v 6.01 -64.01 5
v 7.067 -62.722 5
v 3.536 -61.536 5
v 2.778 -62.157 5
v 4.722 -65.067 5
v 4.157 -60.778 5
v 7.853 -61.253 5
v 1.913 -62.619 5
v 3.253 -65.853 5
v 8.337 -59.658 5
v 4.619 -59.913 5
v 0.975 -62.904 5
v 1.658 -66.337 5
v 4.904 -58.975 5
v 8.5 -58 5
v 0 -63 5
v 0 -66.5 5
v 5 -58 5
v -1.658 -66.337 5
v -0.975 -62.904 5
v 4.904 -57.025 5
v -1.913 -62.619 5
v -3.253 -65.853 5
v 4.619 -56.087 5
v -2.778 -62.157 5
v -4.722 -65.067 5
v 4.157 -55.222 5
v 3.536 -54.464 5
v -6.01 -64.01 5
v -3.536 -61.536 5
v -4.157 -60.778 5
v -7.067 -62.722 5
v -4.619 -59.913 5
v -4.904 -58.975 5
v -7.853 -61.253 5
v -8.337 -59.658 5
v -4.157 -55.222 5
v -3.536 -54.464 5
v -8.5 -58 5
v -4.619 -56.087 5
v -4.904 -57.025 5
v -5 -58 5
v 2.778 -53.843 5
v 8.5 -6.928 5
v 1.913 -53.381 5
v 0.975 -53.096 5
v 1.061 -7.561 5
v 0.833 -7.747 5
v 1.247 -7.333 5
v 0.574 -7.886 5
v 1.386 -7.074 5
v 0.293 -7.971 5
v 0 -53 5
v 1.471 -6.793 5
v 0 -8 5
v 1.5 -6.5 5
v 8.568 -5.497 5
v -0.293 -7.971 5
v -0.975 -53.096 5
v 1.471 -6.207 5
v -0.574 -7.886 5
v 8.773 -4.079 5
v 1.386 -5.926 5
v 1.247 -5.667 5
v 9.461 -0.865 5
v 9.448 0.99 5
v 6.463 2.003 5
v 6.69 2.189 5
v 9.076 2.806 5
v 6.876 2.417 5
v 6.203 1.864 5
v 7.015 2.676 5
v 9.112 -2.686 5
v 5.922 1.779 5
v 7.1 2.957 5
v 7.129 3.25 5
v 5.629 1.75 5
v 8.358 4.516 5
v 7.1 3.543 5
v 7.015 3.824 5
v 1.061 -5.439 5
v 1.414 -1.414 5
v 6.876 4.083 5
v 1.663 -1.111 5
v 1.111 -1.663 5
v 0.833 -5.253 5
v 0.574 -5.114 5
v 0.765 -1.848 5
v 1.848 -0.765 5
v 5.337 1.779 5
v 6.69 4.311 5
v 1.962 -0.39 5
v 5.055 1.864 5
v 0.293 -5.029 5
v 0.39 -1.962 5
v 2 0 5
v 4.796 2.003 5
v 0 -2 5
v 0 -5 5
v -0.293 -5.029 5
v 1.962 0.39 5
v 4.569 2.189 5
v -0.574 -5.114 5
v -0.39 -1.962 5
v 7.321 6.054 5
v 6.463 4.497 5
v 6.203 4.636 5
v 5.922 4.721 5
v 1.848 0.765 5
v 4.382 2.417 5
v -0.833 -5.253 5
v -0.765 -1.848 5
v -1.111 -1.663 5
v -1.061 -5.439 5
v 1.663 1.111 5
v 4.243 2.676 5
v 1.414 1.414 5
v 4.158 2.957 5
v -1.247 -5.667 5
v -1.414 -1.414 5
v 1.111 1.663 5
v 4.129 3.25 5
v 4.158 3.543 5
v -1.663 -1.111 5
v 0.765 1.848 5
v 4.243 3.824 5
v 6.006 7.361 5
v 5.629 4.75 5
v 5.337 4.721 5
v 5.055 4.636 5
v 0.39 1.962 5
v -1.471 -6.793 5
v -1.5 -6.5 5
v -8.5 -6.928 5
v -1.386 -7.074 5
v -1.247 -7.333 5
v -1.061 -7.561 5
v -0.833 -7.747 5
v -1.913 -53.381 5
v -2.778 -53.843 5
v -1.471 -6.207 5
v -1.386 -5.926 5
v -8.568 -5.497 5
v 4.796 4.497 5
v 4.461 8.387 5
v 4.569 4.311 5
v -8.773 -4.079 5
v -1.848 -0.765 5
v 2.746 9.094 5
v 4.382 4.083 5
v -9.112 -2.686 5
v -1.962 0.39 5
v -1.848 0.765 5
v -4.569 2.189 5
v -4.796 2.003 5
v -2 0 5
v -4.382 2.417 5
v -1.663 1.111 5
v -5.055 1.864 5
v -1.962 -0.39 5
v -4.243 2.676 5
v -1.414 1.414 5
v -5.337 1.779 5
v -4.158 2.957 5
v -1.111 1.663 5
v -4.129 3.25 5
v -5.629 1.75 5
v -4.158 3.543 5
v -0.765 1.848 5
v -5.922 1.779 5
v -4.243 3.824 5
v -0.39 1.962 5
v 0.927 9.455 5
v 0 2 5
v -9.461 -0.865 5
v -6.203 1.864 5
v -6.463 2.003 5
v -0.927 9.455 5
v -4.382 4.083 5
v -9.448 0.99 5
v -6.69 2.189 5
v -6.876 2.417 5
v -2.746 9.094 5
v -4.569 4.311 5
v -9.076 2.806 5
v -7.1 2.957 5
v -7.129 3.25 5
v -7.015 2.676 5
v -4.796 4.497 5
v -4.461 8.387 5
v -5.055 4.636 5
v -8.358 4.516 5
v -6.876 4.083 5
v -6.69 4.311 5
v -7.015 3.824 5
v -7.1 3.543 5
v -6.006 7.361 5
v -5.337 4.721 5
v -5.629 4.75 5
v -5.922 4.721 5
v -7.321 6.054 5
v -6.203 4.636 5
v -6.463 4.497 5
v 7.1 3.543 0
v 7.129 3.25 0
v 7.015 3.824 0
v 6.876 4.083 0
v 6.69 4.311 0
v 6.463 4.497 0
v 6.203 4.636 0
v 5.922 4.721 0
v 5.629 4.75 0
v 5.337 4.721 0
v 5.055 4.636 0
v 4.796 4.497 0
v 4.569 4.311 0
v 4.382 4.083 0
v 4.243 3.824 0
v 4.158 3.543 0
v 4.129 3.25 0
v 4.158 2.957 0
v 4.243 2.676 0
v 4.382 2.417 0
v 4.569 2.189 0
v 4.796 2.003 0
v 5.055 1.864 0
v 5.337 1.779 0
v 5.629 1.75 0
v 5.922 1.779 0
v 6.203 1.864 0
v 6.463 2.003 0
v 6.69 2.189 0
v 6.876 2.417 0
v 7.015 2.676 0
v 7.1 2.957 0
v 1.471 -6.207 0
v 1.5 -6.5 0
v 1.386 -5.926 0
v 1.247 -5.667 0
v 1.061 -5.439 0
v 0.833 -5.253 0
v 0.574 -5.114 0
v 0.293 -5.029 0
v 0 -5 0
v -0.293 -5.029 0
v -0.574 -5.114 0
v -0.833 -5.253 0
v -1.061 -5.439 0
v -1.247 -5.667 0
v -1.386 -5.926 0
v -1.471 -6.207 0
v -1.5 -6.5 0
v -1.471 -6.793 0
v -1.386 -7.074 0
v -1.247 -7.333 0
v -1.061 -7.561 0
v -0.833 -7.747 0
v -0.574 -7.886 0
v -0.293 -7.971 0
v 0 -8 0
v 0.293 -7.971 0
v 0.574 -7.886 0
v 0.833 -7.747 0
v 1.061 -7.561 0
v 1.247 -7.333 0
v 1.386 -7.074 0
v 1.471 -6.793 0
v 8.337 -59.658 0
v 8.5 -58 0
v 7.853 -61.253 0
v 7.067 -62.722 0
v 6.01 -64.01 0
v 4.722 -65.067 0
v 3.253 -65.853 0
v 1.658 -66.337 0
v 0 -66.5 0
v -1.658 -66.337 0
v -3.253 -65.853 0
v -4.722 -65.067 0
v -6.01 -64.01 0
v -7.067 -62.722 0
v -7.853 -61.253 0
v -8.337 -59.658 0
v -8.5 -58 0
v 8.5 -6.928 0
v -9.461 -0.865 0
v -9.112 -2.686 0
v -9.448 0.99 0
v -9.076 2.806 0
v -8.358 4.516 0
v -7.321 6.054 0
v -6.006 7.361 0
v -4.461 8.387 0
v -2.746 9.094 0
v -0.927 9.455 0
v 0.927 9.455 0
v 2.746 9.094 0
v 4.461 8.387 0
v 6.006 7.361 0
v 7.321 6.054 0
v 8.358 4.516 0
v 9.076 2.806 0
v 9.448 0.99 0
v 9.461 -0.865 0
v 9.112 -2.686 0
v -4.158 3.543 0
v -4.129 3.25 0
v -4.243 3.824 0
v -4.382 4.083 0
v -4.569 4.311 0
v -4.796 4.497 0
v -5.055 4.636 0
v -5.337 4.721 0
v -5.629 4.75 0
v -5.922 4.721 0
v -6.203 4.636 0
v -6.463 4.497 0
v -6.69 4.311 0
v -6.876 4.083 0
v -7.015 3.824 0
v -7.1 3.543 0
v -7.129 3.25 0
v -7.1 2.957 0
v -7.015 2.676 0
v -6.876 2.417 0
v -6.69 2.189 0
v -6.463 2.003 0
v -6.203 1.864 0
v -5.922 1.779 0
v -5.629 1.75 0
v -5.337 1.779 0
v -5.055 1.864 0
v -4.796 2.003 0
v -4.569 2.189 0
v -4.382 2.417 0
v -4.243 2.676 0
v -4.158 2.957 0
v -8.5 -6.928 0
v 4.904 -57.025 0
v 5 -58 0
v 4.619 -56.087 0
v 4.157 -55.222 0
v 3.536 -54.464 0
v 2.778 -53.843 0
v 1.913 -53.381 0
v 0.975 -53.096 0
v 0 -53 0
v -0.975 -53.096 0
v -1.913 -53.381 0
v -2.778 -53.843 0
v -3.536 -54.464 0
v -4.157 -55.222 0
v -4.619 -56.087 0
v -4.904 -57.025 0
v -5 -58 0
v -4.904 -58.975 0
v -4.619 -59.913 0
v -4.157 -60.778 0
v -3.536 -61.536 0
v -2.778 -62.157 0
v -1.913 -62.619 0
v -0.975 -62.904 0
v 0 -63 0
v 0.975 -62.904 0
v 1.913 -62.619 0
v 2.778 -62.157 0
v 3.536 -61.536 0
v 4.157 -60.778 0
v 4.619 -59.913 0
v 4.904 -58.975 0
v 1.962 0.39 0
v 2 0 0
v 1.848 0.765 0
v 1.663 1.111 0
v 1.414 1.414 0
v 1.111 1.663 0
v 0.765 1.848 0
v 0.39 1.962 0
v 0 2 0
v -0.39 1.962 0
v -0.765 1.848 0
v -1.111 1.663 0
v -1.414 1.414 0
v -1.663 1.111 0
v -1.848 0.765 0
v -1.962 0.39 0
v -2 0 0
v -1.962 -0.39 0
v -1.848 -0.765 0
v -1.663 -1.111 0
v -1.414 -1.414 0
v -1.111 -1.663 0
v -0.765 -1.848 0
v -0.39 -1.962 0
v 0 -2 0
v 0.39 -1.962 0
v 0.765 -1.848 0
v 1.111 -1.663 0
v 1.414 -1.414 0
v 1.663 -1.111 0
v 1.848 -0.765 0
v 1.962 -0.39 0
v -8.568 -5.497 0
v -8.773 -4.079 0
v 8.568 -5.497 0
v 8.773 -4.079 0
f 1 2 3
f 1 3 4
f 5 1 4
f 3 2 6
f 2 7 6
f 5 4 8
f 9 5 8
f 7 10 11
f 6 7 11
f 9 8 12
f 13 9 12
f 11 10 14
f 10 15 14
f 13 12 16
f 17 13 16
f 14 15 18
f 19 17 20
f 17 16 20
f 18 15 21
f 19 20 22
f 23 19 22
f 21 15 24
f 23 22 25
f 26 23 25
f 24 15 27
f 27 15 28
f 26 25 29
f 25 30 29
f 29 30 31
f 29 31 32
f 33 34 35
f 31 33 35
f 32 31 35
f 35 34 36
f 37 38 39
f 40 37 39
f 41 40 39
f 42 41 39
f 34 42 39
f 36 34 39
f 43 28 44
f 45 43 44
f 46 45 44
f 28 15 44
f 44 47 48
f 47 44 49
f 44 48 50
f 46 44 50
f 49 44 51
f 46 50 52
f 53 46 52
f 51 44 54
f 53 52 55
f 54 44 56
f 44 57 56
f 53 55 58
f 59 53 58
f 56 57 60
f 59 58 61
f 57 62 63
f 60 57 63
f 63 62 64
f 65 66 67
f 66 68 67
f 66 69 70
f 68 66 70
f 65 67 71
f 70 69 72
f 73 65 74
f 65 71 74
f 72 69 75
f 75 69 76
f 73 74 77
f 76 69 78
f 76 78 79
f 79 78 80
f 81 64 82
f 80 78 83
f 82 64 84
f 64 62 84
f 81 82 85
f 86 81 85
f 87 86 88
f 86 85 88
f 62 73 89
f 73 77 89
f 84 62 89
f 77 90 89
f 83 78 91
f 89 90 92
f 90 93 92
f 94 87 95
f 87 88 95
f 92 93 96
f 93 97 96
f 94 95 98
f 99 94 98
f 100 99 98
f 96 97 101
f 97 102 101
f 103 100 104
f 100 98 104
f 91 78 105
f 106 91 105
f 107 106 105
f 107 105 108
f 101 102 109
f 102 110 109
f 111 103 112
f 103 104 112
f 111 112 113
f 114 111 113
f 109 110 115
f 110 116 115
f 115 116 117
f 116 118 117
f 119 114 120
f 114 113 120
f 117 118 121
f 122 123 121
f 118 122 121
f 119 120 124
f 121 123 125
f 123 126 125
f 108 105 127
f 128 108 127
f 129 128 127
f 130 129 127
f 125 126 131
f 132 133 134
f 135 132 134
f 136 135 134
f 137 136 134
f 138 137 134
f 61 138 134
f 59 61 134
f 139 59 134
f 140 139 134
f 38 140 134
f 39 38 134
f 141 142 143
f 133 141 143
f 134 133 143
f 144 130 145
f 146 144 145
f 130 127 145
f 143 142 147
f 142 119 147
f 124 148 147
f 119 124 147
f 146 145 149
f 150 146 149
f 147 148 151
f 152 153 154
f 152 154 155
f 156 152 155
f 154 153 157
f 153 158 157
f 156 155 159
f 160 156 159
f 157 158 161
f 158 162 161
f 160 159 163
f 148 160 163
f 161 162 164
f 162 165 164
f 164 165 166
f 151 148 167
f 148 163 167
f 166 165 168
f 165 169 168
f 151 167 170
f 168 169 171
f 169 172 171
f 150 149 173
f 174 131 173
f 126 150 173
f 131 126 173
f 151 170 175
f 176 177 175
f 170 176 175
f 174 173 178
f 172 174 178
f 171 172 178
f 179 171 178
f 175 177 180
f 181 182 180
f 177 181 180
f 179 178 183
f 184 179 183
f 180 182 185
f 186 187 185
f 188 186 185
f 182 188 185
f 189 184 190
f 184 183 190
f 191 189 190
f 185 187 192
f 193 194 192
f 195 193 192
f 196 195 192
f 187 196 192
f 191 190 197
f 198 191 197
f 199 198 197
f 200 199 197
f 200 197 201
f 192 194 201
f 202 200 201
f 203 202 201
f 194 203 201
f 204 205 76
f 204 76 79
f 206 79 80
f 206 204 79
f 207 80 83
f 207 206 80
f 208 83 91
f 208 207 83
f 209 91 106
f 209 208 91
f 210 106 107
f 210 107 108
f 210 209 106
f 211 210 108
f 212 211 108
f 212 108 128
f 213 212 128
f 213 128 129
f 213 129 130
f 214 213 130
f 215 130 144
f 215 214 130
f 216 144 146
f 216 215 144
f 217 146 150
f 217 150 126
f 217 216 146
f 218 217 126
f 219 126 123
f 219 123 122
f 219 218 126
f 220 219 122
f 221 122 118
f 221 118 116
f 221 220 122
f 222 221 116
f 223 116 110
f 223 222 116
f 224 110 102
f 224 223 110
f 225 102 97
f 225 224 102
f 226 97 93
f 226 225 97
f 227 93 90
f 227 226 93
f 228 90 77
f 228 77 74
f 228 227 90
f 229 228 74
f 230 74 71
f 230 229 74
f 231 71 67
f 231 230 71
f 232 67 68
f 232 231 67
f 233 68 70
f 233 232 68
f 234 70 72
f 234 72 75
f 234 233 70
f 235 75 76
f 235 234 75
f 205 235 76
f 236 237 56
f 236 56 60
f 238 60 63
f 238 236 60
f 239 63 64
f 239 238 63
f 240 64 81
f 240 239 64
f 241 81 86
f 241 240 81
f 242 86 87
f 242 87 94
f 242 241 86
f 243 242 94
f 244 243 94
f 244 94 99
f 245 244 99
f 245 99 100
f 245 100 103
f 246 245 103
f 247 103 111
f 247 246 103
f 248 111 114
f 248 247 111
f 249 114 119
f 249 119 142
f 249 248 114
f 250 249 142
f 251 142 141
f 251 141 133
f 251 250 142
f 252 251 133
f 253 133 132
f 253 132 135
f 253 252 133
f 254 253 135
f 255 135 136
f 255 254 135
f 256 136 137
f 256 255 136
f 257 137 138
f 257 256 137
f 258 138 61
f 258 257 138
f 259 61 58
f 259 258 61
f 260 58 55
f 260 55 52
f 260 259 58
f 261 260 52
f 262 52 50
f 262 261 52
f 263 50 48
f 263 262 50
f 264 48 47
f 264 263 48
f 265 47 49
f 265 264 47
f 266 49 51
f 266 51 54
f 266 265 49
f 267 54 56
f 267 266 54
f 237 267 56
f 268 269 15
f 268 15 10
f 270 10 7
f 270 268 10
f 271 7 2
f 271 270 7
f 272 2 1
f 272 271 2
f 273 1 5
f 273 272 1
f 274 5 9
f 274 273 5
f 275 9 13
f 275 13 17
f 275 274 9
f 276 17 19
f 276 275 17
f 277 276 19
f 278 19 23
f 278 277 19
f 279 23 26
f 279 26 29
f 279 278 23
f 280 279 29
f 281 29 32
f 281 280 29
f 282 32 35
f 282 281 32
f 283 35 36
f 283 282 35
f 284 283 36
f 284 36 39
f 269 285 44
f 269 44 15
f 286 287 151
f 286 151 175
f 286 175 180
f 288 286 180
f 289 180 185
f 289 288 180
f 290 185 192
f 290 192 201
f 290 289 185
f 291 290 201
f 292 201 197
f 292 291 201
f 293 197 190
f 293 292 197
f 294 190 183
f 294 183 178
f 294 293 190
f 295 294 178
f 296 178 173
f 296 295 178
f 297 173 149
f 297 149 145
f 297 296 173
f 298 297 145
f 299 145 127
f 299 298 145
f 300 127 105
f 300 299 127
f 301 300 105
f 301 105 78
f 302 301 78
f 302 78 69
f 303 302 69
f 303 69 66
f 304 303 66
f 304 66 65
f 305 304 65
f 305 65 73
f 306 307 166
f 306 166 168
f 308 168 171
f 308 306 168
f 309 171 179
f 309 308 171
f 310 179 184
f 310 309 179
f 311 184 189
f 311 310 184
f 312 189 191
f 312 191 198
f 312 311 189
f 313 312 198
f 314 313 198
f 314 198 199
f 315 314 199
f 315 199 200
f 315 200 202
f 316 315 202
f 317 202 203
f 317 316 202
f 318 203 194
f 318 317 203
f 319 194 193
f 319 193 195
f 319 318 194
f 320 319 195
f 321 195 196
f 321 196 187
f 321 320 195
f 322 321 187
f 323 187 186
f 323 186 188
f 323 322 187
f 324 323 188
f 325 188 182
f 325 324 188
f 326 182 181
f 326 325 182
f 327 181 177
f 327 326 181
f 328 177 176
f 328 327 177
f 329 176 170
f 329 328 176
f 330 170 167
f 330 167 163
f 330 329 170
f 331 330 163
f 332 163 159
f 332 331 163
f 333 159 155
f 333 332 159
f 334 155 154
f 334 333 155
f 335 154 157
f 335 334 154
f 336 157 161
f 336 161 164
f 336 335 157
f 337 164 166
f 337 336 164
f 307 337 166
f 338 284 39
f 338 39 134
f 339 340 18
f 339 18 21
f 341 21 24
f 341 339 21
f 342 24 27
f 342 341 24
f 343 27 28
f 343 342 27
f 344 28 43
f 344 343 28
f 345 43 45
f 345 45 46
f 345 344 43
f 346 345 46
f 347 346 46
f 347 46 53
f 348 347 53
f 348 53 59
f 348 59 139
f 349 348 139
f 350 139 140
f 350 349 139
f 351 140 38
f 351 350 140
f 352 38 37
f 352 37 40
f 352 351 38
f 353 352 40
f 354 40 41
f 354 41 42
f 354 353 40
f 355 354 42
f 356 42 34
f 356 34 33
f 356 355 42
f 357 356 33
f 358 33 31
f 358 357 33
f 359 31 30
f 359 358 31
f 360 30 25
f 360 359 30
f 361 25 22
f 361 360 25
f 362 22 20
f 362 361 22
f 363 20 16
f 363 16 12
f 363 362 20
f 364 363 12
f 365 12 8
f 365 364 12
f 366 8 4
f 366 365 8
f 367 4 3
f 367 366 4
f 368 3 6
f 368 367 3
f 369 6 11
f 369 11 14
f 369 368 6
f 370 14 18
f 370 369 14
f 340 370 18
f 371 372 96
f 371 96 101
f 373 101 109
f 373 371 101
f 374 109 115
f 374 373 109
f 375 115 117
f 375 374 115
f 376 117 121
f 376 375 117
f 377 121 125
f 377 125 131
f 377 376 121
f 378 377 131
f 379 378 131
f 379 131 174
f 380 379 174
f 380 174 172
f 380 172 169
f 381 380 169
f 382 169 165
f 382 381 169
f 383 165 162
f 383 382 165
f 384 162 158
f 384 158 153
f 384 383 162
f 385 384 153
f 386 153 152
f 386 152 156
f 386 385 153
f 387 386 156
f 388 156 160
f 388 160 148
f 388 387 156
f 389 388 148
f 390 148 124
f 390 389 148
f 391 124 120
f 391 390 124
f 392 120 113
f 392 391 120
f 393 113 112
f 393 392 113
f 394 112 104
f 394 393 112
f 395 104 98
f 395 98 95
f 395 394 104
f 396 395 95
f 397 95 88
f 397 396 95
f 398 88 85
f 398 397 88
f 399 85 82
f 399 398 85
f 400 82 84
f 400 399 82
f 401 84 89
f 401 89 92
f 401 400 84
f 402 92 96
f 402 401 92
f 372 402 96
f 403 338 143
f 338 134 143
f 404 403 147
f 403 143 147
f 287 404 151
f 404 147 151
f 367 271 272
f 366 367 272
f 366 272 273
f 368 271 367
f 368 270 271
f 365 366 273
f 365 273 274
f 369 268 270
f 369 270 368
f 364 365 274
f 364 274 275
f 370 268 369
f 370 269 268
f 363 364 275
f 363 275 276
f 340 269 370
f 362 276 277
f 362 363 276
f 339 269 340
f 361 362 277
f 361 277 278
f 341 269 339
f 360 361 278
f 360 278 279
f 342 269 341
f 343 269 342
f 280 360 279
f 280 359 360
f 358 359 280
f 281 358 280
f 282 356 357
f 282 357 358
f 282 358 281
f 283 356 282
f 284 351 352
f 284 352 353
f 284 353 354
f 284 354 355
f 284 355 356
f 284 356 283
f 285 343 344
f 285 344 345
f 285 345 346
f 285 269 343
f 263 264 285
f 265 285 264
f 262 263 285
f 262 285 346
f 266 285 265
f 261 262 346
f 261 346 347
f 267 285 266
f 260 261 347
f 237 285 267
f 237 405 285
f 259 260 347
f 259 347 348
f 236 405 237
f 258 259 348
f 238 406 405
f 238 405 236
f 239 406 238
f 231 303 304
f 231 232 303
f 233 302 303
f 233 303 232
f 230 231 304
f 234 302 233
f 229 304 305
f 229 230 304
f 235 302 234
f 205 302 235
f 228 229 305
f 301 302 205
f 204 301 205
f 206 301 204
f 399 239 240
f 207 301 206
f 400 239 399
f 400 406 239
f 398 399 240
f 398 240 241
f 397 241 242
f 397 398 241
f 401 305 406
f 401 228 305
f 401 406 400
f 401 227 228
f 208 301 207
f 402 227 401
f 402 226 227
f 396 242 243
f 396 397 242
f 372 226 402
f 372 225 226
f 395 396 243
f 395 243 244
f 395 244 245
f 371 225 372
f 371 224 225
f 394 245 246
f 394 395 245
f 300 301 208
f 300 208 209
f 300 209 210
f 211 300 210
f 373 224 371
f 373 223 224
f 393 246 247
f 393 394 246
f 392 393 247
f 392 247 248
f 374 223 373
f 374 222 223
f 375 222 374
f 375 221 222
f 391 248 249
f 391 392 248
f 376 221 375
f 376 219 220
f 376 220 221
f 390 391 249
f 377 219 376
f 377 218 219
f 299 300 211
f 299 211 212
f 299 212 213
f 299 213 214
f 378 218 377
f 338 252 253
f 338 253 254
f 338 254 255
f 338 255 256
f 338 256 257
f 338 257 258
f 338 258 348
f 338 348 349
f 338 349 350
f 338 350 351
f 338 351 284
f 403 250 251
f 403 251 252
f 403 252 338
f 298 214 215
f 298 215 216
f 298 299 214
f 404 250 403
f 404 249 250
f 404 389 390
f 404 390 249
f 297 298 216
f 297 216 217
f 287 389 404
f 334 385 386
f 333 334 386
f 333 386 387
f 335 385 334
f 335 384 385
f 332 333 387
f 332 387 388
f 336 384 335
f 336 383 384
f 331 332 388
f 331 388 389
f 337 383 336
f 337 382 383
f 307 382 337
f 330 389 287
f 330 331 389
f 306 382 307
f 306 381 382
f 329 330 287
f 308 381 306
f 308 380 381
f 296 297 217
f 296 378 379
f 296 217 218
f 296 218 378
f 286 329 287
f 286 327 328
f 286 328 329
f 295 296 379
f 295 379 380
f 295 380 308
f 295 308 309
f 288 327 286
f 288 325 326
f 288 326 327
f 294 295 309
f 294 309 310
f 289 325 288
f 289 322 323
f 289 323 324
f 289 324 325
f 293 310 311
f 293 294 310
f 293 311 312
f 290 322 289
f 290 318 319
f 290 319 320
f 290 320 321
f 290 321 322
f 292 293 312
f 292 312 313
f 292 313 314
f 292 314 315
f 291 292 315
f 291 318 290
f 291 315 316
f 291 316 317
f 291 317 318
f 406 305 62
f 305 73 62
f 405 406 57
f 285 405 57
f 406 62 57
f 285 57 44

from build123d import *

# Parameters (mm, degrees)
SKETCH_1_R      = 1.5
SKETCH_1_R_2    = 2
SKETCH_1_R_3    = 5
EXTRUDE_1_DEPTH = 5
FILLET_1_R      = 15


with BuildPart() as part:
    # 草图1 → 凸台-拉伸1 (new body)
    with BuildSketch(Plane.XY):
        with BuildLine():
            Line((-8.5, -58), (-8.5, -4.242640687))
            ThreePointArc((-8.5, -4.242640687), (0, 9.5), (8.5, -4.242640687))
            Line((8.5, -4.242640687), (8.5, -58))
            ThreePointArc((8.5, -58), (0, -66.5), (-8.5, -58))
        make_face()
        with Locations((-5.629165125, 3.25)):
            Circle(SKETCH_1_R, mode=Mode.SUBTRACT)
        Circle(SKETCH_1_R_2, mode=Mode.SUBTRACT)
        with Locations((0, -58)):
            Circle(SKETCH_1_R_3, mode=Mode.SUBTRACT)
        with Locations((5.629165125, 3.25)):
            Circle(SKETCH_1_R, mode=Mode.SUBTRACT)
        with Locations((0, -6.5)):
            Circle(SKETCH_1_R, mode=Mode.SUBTRACT)
    extrude(amount=EXTRUDE_1_DEPTH)

    # 圆角1
    fillet_1_edges = [part.edges().sort_by_distance(p)[0] for p in [
        (-8.5, -4.242640687, 2.5),
        (8.5, -4.242640687, 2.5),
    ]]
    fillet(fillet_1_edges, radius=FILLET_1_R)


solid = part.part
